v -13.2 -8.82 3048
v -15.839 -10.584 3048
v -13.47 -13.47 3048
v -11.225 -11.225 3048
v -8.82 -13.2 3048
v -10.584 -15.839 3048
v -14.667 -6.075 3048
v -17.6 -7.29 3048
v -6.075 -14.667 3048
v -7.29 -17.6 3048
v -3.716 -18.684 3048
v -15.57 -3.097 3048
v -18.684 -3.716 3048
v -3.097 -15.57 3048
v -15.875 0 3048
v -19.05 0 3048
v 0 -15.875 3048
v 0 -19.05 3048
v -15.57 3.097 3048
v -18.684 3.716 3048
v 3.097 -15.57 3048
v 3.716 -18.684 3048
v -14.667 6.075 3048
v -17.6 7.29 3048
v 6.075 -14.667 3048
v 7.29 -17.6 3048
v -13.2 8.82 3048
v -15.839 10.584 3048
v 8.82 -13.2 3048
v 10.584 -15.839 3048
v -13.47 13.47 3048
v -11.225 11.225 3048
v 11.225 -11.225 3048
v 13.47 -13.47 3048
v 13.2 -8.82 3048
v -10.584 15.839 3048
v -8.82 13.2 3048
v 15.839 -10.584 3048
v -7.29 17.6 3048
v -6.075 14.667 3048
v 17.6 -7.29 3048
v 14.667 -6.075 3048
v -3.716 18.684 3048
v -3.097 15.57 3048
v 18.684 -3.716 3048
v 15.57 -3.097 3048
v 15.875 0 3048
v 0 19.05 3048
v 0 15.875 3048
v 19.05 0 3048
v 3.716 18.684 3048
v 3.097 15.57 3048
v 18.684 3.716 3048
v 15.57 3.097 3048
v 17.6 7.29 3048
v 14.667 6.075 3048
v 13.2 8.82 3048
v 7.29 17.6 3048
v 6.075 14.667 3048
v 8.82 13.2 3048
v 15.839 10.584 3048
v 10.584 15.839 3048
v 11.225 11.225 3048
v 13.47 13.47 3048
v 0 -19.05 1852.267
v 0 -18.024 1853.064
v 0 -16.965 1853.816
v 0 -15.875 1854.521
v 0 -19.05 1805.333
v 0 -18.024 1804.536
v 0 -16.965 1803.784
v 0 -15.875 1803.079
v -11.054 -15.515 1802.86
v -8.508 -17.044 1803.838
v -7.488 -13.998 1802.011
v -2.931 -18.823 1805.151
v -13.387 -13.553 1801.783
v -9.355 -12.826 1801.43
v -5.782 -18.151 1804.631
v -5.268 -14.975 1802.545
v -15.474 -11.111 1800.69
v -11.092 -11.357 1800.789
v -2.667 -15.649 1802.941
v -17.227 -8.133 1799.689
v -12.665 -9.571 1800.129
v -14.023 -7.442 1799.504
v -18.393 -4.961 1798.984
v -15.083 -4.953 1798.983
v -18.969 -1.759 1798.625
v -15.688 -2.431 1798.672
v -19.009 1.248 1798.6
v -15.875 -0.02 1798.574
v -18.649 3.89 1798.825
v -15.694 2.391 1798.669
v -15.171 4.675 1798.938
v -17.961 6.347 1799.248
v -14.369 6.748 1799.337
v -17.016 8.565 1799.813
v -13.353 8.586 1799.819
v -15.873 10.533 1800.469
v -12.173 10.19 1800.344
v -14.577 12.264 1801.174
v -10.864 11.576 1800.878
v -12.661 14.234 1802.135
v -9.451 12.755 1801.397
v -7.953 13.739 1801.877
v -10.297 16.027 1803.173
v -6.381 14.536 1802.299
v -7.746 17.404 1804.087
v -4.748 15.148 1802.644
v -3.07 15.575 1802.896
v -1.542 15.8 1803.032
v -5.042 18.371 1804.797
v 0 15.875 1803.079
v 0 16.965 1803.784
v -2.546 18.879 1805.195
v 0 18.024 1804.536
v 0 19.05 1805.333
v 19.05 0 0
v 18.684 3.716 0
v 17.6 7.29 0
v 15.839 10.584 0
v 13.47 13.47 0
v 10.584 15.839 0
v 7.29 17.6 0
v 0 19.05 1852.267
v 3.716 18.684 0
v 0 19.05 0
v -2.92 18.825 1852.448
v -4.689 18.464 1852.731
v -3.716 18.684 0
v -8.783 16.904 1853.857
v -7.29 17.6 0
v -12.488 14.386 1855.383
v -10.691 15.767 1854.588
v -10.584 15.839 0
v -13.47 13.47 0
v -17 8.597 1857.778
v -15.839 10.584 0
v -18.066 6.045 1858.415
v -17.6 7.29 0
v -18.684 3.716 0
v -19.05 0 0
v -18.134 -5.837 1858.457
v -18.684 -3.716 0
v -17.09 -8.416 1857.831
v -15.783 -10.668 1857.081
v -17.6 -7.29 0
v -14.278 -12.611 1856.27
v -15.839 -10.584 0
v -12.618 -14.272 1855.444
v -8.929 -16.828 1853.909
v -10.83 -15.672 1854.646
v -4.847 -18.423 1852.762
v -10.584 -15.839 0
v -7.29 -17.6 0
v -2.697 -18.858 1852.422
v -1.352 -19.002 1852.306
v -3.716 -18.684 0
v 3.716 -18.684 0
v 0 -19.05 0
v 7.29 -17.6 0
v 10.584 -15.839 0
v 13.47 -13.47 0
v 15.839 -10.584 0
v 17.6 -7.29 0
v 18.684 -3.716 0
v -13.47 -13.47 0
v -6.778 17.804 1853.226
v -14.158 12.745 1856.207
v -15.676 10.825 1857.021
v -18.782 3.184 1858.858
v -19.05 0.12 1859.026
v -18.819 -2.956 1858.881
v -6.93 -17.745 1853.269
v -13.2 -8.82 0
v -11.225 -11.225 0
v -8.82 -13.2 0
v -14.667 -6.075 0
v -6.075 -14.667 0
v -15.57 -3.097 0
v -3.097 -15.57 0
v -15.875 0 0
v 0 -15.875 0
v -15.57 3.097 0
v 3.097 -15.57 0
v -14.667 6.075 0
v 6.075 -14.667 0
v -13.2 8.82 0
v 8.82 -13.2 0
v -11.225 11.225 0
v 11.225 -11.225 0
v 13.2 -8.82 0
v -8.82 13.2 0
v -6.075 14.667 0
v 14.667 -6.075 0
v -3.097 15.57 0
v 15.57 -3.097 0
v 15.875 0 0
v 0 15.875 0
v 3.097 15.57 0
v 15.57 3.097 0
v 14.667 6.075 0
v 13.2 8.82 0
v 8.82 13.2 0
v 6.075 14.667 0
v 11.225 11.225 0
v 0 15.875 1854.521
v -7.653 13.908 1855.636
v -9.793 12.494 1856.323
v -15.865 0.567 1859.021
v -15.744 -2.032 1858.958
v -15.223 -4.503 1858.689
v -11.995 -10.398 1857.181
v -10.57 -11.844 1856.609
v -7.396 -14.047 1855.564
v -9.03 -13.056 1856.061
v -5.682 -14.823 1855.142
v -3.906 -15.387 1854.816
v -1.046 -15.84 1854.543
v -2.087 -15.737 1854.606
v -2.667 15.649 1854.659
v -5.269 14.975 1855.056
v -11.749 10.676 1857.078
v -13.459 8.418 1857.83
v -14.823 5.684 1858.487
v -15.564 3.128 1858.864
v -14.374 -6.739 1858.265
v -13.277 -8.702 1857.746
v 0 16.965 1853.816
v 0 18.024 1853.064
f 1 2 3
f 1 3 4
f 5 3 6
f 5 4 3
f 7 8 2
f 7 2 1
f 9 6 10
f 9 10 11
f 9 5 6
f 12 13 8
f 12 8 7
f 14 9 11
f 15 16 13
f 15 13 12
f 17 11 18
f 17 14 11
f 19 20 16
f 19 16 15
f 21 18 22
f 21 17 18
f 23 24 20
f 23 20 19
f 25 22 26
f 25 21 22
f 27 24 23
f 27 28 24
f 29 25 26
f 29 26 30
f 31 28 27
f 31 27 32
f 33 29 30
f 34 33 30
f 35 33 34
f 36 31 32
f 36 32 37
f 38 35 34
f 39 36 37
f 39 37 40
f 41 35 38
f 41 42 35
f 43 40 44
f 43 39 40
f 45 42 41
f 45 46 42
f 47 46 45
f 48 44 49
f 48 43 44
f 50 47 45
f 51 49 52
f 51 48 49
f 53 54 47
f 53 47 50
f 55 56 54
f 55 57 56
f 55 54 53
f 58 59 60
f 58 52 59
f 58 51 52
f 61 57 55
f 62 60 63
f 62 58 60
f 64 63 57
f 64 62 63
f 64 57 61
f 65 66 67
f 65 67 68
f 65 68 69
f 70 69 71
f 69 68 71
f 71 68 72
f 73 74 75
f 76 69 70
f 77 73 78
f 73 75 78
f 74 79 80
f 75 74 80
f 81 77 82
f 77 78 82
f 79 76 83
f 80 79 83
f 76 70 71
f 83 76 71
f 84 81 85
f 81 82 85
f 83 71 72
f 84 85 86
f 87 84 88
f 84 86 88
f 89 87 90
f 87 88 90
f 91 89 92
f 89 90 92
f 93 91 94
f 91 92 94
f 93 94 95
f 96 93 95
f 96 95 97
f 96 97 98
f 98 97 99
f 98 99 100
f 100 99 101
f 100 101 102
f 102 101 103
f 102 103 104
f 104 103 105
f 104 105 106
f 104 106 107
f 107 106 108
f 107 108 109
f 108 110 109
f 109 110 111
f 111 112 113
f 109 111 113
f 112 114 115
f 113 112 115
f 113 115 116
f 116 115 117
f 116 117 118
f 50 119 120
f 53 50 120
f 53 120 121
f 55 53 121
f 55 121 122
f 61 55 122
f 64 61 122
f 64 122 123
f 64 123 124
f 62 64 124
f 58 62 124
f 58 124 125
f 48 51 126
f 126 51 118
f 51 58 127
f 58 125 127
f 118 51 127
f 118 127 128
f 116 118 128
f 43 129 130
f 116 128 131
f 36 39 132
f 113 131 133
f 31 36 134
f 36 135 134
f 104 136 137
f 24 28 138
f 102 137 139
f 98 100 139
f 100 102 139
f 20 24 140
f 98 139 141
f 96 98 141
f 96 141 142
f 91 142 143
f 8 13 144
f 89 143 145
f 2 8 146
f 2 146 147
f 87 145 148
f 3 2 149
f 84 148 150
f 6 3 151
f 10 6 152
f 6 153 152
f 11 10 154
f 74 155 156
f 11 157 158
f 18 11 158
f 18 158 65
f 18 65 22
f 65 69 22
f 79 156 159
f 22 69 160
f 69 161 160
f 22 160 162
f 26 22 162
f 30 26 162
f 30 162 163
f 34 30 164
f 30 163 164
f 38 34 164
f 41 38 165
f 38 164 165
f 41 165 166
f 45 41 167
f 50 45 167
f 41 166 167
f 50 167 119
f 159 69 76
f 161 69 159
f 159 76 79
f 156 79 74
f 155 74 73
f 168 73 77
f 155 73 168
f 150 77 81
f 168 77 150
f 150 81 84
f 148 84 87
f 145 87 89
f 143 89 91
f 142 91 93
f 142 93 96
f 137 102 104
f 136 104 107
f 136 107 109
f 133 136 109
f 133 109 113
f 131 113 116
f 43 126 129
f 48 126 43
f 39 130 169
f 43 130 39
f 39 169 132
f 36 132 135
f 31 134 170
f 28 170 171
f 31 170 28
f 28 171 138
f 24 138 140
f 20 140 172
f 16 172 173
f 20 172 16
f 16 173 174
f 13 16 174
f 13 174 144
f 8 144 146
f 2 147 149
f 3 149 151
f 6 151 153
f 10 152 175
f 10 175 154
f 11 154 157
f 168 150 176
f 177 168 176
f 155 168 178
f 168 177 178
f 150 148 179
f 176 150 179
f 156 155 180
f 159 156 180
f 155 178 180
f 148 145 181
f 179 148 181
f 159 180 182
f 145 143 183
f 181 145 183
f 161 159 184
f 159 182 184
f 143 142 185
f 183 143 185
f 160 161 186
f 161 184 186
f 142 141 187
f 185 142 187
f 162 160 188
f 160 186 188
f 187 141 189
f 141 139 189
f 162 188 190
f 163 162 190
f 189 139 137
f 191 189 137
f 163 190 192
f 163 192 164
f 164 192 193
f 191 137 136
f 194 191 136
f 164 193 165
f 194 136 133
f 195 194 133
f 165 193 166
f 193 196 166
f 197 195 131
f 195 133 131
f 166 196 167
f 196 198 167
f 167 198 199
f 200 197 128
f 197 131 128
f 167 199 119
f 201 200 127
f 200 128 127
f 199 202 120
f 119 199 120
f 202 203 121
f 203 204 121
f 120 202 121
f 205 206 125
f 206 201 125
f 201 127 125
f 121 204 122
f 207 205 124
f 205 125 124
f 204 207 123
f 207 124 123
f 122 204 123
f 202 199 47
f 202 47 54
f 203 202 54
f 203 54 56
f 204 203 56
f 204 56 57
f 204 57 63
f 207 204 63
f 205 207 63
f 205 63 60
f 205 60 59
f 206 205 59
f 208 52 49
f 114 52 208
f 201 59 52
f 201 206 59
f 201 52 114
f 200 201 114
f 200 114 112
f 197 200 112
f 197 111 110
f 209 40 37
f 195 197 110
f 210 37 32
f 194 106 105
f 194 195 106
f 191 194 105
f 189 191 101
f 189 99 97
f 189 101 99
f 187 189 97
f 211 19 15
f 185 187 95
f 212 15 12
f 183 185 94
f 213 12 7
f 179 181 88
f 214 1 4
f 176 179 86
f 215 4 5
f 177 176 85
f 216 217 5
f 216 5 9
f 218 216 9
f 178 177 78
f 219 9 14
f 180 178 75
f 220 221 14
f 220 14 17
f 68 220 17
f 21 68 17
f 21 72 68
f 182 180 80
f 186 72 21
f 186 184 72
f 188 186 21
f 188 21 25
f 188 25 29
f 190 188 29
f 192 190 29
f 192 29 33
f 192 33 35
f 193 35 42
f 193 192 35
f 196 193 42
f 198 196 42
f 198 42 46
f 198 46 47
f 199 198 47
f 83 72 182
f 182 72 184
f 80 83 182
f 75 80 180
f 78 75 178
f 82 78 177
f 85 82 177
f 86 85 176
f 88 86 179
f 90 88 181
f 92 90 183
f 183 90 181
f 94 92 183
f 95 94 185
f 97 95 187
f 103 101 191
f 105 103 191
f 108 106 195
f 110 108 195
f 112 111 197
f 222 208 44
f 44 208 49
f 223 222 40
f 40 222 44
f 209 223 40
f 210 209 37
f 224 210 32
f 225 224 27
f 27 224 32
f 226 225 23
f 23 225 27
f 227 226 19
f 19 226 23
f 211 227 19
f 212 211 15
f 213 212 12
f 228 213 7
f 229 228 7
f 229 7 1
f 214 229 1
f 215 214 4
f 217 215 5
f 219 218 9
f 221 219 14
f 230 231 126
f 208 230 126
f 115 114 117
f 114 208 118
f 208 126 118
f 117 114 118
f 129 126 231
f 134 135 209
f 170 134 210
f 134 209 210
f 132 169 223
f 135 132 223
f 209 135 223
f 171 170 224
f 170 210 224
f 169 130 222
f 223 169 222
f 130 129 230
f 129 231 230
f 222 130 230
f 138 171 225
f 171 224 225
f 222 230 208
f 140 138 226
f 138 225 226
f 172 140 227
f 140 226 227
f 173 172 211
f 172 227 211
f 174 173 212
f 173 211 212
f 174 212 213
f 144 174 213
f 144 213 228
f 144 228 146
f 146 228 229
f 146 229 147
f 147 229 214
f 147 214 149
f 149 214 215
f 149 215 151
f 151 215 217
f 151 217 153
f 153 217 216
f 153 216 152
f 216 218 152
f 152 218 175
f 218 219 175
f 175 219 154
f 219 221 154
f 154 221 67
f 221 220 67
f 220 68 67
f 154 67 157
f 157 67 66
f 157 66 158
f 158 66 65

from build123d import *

# Parameters (mm, degrees)
SKETCH1_R           = 19.05
SKETCH1_R_2         = 15.875
BOSS_EXTRUDE1_DEPTH = 3048
SKETCH2_R           = 30.226
CUT_EXTRUDE1_DEPTH  = 20.05


with BuildPart() as part:
    # Sketch1 → Boss-Extrude1 (new body)
    with BuildSketch(Plane.XY):
        Circle(SKETCH1_R)
        Circle(SKETCH1_R_2, mode=Mode.SUBTRACT)
    extrude(amount=BOSS_EXTRUDE1_DEPTH)

    # Sketch2 → Cut-Extrude1 (cut, through all)
    with BuildSketch(Plane(origin=(0, 0, 0), x_dir=(0, 0, -1), z_dir=(1, 0, 0))):
        with Locations((-1828.8, 0)):
            Circle(SKETCH2_R)
    extrude(amount=-CUT_EXTRUDE1_DEPTH, mode=Mode.SUBTRACT)


solid = part.part
